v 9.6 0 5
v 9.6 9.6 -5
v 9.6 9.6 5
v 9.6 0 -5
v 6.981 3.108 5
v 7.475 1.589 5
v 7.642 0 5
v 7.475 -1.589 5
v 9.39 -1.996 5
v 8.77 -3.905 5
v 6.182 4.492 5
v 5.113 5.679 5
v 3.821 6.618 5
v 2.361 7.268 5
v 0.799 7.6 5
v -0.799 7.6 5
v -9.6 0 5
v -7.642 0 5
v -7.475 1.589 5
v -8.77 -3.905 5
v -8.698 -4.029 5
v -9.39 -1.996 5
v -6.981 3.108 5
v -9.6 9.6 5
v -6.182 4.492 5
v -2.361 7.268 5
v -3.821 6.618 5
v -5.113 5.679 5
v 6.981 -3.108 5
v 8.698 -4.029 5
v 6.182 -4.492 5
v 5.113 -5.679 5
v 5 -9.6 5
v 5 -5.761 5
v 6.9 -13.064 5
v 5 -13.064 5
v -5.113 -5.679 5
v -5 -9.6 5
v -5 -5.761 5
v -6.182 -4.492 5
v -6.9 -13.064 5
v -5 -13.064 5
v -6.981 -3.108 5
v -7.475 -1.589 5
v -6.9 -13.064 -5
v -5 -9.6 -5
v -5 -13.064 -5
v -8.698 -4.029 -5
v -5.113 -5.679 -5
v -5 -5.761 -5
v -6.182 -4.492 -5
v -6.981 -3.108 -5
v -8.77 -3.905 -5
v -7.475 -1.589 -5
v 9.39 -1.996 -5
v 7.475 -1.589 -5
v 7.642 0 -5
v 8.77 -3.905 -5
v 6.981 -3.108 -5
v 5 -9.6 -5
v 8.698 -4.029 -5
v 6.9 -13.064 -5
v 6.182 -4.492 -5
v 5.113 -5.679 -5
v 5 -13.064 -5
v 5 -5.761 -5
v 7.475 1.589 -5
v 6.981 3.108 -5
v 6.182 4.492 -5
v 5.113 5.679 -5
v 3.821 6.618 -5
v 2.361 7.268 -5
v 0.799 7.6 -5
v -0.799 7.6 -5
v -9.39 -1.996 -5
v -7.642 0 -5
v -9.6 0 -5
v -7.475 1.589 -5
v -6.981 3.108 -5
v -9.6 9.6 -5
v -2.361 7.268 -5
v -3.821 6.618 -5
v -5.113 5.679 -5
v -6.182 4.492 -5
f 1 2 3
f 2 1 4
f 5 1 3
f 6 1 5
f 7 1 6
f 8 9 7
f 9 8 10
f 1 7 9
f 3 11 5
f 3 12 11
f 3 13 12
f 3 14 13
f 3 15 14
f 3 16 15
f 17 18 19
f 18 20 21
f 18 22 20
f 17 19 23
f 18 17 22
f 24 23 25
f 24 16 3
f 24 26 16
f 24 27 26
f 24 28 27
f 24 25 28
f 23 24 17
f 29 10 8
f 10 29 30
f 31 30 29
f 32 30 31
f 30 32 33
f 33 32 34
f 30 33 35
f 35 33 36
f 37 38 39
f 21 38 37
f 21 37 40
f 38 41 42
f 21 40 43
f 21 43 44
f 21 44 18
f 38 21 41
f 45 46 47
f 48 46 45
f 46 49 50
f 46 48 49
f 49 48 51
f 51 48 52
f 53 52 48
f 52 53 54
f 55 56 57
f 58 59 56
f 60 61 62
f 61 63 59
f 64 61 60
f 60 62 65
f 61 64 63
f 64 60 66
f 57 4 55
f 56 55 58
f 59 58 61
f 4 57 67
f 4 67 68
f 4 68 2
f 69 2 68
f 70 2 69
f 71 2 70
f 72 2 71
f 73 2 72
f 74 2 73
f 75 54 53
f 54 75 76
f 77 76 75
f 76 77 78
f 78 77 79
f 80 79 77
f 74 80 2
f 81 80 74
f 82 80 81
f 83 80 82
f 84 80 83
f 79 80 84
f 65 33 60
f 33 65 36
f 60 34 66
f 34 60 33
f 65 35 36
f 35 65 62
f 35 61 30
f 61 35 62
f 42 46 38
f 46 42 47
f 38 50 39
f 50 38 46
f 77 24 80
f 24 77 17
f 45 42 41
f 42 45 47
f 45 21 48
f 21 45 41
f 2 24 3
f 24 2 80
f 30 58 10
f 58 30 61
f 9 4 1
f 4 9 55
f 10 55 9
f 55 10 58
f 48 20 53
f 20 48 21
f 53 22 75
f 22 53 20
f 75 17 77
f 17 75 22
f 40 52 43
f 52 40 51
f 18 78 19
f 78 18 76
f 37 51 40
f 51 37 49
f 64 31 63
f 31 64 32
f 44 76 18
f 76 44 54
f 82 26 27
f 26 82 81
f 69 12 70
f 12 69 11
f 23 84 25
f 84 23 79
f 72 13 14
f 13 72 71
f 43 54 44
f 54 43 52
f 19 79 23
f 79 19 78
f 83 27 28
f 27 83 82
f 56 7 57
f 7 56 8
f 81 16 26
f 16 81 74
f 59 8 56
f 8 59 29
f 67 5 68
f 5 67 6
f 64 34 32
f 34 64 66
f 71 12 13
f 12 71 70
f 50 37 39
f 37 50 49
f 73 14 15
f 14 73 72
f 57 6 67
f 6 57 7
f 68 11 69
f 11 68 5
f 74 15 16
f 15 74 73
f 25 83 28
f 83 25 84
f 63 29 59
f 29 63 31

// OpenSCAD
// file: functions.scad
// PRUSA iteration3
// Functions used in many files
// GNU GPL v3
// Josef Pr?ša <josefprusa@me.com>
// Václav 'ax' H?la <axtheb@gmail.com>
// Vlnofka <>
// http://www.reprap.org/wiki/Prusa_Mendel
// http://github.com/prusajr/PrusaMendel

module chamfer(x=10,y=10,z=10) {
 rotate(a=[90,-90,0])
 linear_extrude(height = y, center = true, convexity = 2, twist = 0)
 polygon(points = [
[-1.00,-1.00]
,[-1.00,x]
,[0.00,x]
,[z,0.00]
,[z,-1.00]
]
,paths = [
[0,1,2,3,4]]
       );
}

module nut(d,h,horizontal=true){
    cornerdiameter =  (d / 2) / cos (180 / 6);
    cylinder(h = h, r = cornerdiameter, $fn = 6);
    if(horizontal){
        for(i = [1:6]){
            rotate([0,0,60*i]) translate([-cornerdiameter-0.2,0,0]) rotate([0,0,-45]) cube([2,2,h]);
        }
    }
}

// Based on nophead research
module polyhole(d, h, center=false) {
    n = max(round(2 * d),3);
    rotate([0,0,180])
        cylinder(h = h, r = (d / 2) / cos (180 / n), $fn = n, center=center);
}

// make it interchangeable between this and cylinder
module cylinder_poly(r, h, center=false){
    polyhole(d=r*2, h=h, center=center);
}

module fillet(radius, height=100, $fn=0) {
    //this creates acutal fillet
    translate([-radius, -radius, -height/2-0.01])
        difference() {
            cube([radius*2, radius*2, height+0.02]);
            cylinder(r=radius, h=height+0.02, $fn=$fn);
        }
}

module cube_fillet(size, radius=-1, vertical=[3,3,3,3], top=[0,0,0,0], bottom=[0,0,0,0], center=false, $fn=0){
    //
    if (center) {
        cube_fillet_inside(size, radius, vertical, top, bottom, $fn);
    } else {
        translate([size[0]/2, size[1]/2, size[2]/2])
            cube_fillet_inside(size, radius, vertical, top, bottom, $fn);
    }
}

module cube_negative_fillet(size, radius=-1, vertical=[3,3,3,3], top=[0,0,0,0], bottom=[0,0,0,0], $fn=0){

    j=[1,0,1,0];

    for (i=[0:3]) {
        if (radius > -1) {
            rotate([0, 0, 90*i]) translate([size[1-j[i]]/2, size[j[i]]/2, 0]) fillet(radius, size[2], $fn=$fn);
        } else {
            rotate([0, 0, 90*i]) translate([size[1-j[i]]/2, size[j[i]]/2, 0]) fillet(vertical[i], size[2], $fn=$fn);
        }
        rotate([90*i, -90, 0]) translate([size[2]/2, size[j[i]]/2, 0 ]) fillet(top[i], size[1-j[i]], $fn=$fn);
        rotate([90*(4-i), 90, 0]) translate([size[2]/2, size[j[i]]/2, 0]) fillet(bottom[i], size[1-j[i]], $fn=$fn);

    }
}

module cube_fillet_inside(size, radius=-1, vertical=[3,3,3,3], top=[0,0,0,0], bottom=[0,0,0,0], $fn=0){
    //makes CENTERED cube with round corners
    // if you give it radius, it will fillet vertical corners.
    //othervise use vertical, top, bottom arrays
    //when viewed from top, it starts in upper right corner (+x,+y quadrant) , goes counterclockwise
    //top/bottom fillet starts in direction of Y axis and goes CCW too


    if (radius == 0) {
        cube(size, center=true);
    } else {
        difference() {
            cube(size, center=true);
            cube_negative_fillet(size, radius, vertical, top, bottom, $fn);
        }
    }
}

module screw(h=20, r=2, r_head=3.5, head_drop=0, slant=true, poly=false, $fn=0){
    //makes screw with head
    //for substraction as screw hole
    if (poly) {
        cylinder_poly(h=h, r=r, $fn=$fn);
    } else {
        cylinder(h=h, r=r, $fn=$fn);
    }
    if (slant) {
        translate([0, 0, head_drop-0.01]) cylinder(h=r_head, r2=0, r1=r_head, $fn=$fn);
    }

    if (head_drop > 0) {
        translate([0, 0, -0.01]) cylinder(h=head_drop+0.01, r=r_head, $fn=$fn);
    }
}

//cube_fillet([10,20,30], vertical=[3,2,0,0], top=[3,2,0,5], bottom=[3,2,0,5]);
//cube_fillet([10,20,30], radius=2, top=[7,2,7,2]);
// main file
// LM8UU holder slim v1.1
// *********************************************
// Jonas Kühling
// http://www.jonaskuehling.de
// http://www.thingiverse.com/jonaskuehling
// *********************************************
// derived from:
// http://www.thingiverse.com/thing:14942
include <functions.scad>

// LM8UU/rod dimensions
LM8UU_dia = 15.2;
LM8UU_length = 24;
rod_dia = 8;

//screw/nut dimensions (M3) - hexagon socket head cap screw ISO 4762, hexagon nut ISO 4032
screw_thread_dia_iso = 3;
screw_head_dia_iso = 5.5;
nut_wrench_size_iso = 5.5;


// screw/nut dimensions for use (plus clearance for fitting purpose)
clearance_dia = 0.5;
screw_thread_dia = screw_thread_dia_iso + clearance_dia;
screw_head_dia = screw_head_dia_iso + clearance_dia;
nut_wrench_size = nut_wrench_size_iso + clearance_dia;
nut_dia_perimeter = (nut_wrench_size/cos(30));
nut_dia = nut_dia_perimeter;
nut_surround_thickness = 2;

// main body dimensions
body_wall_thickness = 2;
body_width = LM8UU_dia + (2*body_wall_thickness);
body_height = body_width;
body_length = LM8UU_length;
gap_width = rod_dia + 2;
screw_bushing_space = 1;
screw_elevation = LM8UU_dia + body_wall_thickness + (screw_thread_dia/2) +screw_bushing_space;

// TEST - uncomment to render in openscad:
// lm8uu_holder(1);		// WITH mountplate
// lm8uu_holder();		// WITHOUT mountplate


// nophead's polyhole module for better lm8uu-fit
module polyhole(d,h, center = true) {
    n = max(round(2 * d),3);
    rotate([0,0,180])
        cylinder(h = h, r = (d / 2) / cos (180 / n), $fn = n, center = center);
}


module mount_plate()
{
	difference()
	{
		translate([0,0,1.5])
		cube([body_width+2*screw_head_dia+4*nut_surround_thickness,screw_head_dia+2*nut_surround_thickness,3], center=true);

		for(i=[-1,1])
			translate([i*(body_width/2+nut_surround_thickness+screw_head_dia/2),0,-0.5])
				cylinder(r=screw_thread_dia/2, h=4, $fn=20);
	}
}

module bearing_cutout() {
	rotate([90,0,0]) translate([0,0,-(LM8UU_length+1)/2]) polyhole(LM8UU_dia,LM8UU_length+1);
}

module bearing_cutout_vertical() {
	translate([0,0,body_length/2]) translate([0,0,-(LM8UU_length+1)/2]) polyhole(LM8UU_dia,LM8UU_length+1);
}

module lm8uu_holder_vertical() {
	difference()
	{
		union()
		{
			// body
			translate([0,body_height/4,0])
				cube([body_width,body_height/2,body_length], center=true);
			cylinder(r=(LM8UU_dia/2)+body_wall_thickness, h=LM8UU_length, center=true);
	
			// gap support

			difference() {
				translate([(gap_width/2),-((LM8UU_dia/2)+nut_surround_thickness+(nut_dia/2)),-(body_length/2)]) cube([(LM8UU_dia/2)+body_wall_thickness-(gap_width/2),(LM8UU_dia/2)+nut_surround_thickness+(nut_dia/2),LM8UU_length]);
				translate([(gap_width/2)+body_wall_thickness*2+0.5,-((LM8UU_dia/2)+nut_surround_thickness+(nut_dia/2)),0]) rotate([-90,0,0]) chamfer(x=(LM8UU_dia/2)-(gap_width/2),y=LM8UU_length+1,z=(LM8UU_dia/2)+nut_surround_thickness+(nut_dia/2));
			}
			difference() {
				translate([-((LM8UU_dia/2)+body_wall_thickness),-((LM8UU_dia/2)+nut_surround_thickness+(nut_dia/2)),-(body_length/2)]) cube([(LM8UU_dia/2)+body_wall_thickness-(gap_width/2),(LM8UU_dia/2)+nut_surround_thickness+(nut_dia/2),LM8UU_length]);
				translate([-((gap_width/2)+body_wall_thickness*2+0.5),-((LM8UU_dia/2)+nut_surround_thickness+(nut_dia/2)),0]) rotate([-90,180,0]) chamfer(x=(LM8UU_dia/2)-(gap_width/2),y=LM8UU_length+1,z=(LM8UU_dia/2)+nut_surround_thickness+(nut_dia/2));
			}

		}
		// bushing hole
			polyhole(LM8UU_dia,LM8UU_length+1);
	
		// top gap
		translate([-(gap_width/2),-(LM8UU_dia/2)-body_wall_thickness,-(body_length/2)-1])
			cube([gap_width,(LM8UU_dia/2)+body_wall_thickness,LM8UU_length+2]);
	
		// screw hole (one all the way through)
		#translate([0,-screw_elevation/2,0])
			rotate([0,90,0])
				cylinder(r=screw_thread_dia/2, h=body_width+3, center=true, $fn=20);
	
		// nut trap
		translate([gap_width/2+body_wall_thickness,-screw_elevation/2,0])
			rotate([0,90,0])
				cylinder(r=nut_dia/2, h=body_width/2-gap_width/2-body_wall_thickness+1,$fn=6);
	
		// screw head hole
		translate([-(gap_width)/2-body_wall_thickness,-screw_elevation/2,0])
			rotate([0,-90,0])
				cylinder(r=screw_head_dia/2, h=body_width/2-gap_width/2-body_wall_thickness+1,$fn=20);
	
	}
}

module lm8uu_spacer(length=10) {
	difference()
	{
		union()
		{
			// body
			translate([0,body_height/4,0])
				cube([body_width,body_height/2,length], center=true);
			cylinder(r=(LM8UU_dia/2)+body_wall_thickness, h=length, center=true);
	
			// gap support

			difference() {
				translate([(gap_width/2),-((LM8UU_dia/2)+nut_surround_thickness+(nut_dia/2)),-(length/2)]) cube([(LM8UU_dia/2)+body_wall_thickness-(gap_width/2),(LM8UU_dia/2)+nut_surround_thickness+(nut_dia/2),length]);
				translate([(gap_width/2)+body_wall_thickness*2+0.5,-((LM8UU_dia/2)+nut_surround_thickness+(nut_dia/2)),0]) rotate([-90,0,0]) chamfer(x=(LM8UU_dia/2)-(gap_width/2),y=length+1,z=(LM8UU_dia/2)+nut_surround_thickness+(nut_dia/2));
			}
			difference() {
				translate([-((LM8UU_dia/2)+body_wall_thickness),-((LM8UU_dia/2)+nut_surround_thickness+(nut_dia/2)),-(length/2)]) cube([(LM8UU_dia/2)+body_wall_thickness-(gap_width/2),(LM8UU_dia/2)+nut_surround_thickness+(nut_dia/2),length]);
				translate([-((gap_width/2)+body_wall_thickness*2+0.5),-((LM8UU_dia/2)+nut_surround_thickness+(nut_dia/2)),0]) rotate([-90,180,0]) chamfer(x=(LM8UU_dia/2)-(gap_width/2),y=length+1,z=(LM8UU_dia/2)+nut_surround_thickness+(nut_dia/2));
			}

		}
		// bushing hole
			polyhole(LM8UU_dia,length+1);
	
		// top gap
		translate([-(gap_width/2),-(LM8UU_dia/2)-body_wall_thickness,-(length/2)-1])
			cube([gap_width,(LM8UU_dia/2)+body_wall_thickness,length+2]);
	}
}

lm8uu_spacer();
//lm8uu_holder_vertical();
